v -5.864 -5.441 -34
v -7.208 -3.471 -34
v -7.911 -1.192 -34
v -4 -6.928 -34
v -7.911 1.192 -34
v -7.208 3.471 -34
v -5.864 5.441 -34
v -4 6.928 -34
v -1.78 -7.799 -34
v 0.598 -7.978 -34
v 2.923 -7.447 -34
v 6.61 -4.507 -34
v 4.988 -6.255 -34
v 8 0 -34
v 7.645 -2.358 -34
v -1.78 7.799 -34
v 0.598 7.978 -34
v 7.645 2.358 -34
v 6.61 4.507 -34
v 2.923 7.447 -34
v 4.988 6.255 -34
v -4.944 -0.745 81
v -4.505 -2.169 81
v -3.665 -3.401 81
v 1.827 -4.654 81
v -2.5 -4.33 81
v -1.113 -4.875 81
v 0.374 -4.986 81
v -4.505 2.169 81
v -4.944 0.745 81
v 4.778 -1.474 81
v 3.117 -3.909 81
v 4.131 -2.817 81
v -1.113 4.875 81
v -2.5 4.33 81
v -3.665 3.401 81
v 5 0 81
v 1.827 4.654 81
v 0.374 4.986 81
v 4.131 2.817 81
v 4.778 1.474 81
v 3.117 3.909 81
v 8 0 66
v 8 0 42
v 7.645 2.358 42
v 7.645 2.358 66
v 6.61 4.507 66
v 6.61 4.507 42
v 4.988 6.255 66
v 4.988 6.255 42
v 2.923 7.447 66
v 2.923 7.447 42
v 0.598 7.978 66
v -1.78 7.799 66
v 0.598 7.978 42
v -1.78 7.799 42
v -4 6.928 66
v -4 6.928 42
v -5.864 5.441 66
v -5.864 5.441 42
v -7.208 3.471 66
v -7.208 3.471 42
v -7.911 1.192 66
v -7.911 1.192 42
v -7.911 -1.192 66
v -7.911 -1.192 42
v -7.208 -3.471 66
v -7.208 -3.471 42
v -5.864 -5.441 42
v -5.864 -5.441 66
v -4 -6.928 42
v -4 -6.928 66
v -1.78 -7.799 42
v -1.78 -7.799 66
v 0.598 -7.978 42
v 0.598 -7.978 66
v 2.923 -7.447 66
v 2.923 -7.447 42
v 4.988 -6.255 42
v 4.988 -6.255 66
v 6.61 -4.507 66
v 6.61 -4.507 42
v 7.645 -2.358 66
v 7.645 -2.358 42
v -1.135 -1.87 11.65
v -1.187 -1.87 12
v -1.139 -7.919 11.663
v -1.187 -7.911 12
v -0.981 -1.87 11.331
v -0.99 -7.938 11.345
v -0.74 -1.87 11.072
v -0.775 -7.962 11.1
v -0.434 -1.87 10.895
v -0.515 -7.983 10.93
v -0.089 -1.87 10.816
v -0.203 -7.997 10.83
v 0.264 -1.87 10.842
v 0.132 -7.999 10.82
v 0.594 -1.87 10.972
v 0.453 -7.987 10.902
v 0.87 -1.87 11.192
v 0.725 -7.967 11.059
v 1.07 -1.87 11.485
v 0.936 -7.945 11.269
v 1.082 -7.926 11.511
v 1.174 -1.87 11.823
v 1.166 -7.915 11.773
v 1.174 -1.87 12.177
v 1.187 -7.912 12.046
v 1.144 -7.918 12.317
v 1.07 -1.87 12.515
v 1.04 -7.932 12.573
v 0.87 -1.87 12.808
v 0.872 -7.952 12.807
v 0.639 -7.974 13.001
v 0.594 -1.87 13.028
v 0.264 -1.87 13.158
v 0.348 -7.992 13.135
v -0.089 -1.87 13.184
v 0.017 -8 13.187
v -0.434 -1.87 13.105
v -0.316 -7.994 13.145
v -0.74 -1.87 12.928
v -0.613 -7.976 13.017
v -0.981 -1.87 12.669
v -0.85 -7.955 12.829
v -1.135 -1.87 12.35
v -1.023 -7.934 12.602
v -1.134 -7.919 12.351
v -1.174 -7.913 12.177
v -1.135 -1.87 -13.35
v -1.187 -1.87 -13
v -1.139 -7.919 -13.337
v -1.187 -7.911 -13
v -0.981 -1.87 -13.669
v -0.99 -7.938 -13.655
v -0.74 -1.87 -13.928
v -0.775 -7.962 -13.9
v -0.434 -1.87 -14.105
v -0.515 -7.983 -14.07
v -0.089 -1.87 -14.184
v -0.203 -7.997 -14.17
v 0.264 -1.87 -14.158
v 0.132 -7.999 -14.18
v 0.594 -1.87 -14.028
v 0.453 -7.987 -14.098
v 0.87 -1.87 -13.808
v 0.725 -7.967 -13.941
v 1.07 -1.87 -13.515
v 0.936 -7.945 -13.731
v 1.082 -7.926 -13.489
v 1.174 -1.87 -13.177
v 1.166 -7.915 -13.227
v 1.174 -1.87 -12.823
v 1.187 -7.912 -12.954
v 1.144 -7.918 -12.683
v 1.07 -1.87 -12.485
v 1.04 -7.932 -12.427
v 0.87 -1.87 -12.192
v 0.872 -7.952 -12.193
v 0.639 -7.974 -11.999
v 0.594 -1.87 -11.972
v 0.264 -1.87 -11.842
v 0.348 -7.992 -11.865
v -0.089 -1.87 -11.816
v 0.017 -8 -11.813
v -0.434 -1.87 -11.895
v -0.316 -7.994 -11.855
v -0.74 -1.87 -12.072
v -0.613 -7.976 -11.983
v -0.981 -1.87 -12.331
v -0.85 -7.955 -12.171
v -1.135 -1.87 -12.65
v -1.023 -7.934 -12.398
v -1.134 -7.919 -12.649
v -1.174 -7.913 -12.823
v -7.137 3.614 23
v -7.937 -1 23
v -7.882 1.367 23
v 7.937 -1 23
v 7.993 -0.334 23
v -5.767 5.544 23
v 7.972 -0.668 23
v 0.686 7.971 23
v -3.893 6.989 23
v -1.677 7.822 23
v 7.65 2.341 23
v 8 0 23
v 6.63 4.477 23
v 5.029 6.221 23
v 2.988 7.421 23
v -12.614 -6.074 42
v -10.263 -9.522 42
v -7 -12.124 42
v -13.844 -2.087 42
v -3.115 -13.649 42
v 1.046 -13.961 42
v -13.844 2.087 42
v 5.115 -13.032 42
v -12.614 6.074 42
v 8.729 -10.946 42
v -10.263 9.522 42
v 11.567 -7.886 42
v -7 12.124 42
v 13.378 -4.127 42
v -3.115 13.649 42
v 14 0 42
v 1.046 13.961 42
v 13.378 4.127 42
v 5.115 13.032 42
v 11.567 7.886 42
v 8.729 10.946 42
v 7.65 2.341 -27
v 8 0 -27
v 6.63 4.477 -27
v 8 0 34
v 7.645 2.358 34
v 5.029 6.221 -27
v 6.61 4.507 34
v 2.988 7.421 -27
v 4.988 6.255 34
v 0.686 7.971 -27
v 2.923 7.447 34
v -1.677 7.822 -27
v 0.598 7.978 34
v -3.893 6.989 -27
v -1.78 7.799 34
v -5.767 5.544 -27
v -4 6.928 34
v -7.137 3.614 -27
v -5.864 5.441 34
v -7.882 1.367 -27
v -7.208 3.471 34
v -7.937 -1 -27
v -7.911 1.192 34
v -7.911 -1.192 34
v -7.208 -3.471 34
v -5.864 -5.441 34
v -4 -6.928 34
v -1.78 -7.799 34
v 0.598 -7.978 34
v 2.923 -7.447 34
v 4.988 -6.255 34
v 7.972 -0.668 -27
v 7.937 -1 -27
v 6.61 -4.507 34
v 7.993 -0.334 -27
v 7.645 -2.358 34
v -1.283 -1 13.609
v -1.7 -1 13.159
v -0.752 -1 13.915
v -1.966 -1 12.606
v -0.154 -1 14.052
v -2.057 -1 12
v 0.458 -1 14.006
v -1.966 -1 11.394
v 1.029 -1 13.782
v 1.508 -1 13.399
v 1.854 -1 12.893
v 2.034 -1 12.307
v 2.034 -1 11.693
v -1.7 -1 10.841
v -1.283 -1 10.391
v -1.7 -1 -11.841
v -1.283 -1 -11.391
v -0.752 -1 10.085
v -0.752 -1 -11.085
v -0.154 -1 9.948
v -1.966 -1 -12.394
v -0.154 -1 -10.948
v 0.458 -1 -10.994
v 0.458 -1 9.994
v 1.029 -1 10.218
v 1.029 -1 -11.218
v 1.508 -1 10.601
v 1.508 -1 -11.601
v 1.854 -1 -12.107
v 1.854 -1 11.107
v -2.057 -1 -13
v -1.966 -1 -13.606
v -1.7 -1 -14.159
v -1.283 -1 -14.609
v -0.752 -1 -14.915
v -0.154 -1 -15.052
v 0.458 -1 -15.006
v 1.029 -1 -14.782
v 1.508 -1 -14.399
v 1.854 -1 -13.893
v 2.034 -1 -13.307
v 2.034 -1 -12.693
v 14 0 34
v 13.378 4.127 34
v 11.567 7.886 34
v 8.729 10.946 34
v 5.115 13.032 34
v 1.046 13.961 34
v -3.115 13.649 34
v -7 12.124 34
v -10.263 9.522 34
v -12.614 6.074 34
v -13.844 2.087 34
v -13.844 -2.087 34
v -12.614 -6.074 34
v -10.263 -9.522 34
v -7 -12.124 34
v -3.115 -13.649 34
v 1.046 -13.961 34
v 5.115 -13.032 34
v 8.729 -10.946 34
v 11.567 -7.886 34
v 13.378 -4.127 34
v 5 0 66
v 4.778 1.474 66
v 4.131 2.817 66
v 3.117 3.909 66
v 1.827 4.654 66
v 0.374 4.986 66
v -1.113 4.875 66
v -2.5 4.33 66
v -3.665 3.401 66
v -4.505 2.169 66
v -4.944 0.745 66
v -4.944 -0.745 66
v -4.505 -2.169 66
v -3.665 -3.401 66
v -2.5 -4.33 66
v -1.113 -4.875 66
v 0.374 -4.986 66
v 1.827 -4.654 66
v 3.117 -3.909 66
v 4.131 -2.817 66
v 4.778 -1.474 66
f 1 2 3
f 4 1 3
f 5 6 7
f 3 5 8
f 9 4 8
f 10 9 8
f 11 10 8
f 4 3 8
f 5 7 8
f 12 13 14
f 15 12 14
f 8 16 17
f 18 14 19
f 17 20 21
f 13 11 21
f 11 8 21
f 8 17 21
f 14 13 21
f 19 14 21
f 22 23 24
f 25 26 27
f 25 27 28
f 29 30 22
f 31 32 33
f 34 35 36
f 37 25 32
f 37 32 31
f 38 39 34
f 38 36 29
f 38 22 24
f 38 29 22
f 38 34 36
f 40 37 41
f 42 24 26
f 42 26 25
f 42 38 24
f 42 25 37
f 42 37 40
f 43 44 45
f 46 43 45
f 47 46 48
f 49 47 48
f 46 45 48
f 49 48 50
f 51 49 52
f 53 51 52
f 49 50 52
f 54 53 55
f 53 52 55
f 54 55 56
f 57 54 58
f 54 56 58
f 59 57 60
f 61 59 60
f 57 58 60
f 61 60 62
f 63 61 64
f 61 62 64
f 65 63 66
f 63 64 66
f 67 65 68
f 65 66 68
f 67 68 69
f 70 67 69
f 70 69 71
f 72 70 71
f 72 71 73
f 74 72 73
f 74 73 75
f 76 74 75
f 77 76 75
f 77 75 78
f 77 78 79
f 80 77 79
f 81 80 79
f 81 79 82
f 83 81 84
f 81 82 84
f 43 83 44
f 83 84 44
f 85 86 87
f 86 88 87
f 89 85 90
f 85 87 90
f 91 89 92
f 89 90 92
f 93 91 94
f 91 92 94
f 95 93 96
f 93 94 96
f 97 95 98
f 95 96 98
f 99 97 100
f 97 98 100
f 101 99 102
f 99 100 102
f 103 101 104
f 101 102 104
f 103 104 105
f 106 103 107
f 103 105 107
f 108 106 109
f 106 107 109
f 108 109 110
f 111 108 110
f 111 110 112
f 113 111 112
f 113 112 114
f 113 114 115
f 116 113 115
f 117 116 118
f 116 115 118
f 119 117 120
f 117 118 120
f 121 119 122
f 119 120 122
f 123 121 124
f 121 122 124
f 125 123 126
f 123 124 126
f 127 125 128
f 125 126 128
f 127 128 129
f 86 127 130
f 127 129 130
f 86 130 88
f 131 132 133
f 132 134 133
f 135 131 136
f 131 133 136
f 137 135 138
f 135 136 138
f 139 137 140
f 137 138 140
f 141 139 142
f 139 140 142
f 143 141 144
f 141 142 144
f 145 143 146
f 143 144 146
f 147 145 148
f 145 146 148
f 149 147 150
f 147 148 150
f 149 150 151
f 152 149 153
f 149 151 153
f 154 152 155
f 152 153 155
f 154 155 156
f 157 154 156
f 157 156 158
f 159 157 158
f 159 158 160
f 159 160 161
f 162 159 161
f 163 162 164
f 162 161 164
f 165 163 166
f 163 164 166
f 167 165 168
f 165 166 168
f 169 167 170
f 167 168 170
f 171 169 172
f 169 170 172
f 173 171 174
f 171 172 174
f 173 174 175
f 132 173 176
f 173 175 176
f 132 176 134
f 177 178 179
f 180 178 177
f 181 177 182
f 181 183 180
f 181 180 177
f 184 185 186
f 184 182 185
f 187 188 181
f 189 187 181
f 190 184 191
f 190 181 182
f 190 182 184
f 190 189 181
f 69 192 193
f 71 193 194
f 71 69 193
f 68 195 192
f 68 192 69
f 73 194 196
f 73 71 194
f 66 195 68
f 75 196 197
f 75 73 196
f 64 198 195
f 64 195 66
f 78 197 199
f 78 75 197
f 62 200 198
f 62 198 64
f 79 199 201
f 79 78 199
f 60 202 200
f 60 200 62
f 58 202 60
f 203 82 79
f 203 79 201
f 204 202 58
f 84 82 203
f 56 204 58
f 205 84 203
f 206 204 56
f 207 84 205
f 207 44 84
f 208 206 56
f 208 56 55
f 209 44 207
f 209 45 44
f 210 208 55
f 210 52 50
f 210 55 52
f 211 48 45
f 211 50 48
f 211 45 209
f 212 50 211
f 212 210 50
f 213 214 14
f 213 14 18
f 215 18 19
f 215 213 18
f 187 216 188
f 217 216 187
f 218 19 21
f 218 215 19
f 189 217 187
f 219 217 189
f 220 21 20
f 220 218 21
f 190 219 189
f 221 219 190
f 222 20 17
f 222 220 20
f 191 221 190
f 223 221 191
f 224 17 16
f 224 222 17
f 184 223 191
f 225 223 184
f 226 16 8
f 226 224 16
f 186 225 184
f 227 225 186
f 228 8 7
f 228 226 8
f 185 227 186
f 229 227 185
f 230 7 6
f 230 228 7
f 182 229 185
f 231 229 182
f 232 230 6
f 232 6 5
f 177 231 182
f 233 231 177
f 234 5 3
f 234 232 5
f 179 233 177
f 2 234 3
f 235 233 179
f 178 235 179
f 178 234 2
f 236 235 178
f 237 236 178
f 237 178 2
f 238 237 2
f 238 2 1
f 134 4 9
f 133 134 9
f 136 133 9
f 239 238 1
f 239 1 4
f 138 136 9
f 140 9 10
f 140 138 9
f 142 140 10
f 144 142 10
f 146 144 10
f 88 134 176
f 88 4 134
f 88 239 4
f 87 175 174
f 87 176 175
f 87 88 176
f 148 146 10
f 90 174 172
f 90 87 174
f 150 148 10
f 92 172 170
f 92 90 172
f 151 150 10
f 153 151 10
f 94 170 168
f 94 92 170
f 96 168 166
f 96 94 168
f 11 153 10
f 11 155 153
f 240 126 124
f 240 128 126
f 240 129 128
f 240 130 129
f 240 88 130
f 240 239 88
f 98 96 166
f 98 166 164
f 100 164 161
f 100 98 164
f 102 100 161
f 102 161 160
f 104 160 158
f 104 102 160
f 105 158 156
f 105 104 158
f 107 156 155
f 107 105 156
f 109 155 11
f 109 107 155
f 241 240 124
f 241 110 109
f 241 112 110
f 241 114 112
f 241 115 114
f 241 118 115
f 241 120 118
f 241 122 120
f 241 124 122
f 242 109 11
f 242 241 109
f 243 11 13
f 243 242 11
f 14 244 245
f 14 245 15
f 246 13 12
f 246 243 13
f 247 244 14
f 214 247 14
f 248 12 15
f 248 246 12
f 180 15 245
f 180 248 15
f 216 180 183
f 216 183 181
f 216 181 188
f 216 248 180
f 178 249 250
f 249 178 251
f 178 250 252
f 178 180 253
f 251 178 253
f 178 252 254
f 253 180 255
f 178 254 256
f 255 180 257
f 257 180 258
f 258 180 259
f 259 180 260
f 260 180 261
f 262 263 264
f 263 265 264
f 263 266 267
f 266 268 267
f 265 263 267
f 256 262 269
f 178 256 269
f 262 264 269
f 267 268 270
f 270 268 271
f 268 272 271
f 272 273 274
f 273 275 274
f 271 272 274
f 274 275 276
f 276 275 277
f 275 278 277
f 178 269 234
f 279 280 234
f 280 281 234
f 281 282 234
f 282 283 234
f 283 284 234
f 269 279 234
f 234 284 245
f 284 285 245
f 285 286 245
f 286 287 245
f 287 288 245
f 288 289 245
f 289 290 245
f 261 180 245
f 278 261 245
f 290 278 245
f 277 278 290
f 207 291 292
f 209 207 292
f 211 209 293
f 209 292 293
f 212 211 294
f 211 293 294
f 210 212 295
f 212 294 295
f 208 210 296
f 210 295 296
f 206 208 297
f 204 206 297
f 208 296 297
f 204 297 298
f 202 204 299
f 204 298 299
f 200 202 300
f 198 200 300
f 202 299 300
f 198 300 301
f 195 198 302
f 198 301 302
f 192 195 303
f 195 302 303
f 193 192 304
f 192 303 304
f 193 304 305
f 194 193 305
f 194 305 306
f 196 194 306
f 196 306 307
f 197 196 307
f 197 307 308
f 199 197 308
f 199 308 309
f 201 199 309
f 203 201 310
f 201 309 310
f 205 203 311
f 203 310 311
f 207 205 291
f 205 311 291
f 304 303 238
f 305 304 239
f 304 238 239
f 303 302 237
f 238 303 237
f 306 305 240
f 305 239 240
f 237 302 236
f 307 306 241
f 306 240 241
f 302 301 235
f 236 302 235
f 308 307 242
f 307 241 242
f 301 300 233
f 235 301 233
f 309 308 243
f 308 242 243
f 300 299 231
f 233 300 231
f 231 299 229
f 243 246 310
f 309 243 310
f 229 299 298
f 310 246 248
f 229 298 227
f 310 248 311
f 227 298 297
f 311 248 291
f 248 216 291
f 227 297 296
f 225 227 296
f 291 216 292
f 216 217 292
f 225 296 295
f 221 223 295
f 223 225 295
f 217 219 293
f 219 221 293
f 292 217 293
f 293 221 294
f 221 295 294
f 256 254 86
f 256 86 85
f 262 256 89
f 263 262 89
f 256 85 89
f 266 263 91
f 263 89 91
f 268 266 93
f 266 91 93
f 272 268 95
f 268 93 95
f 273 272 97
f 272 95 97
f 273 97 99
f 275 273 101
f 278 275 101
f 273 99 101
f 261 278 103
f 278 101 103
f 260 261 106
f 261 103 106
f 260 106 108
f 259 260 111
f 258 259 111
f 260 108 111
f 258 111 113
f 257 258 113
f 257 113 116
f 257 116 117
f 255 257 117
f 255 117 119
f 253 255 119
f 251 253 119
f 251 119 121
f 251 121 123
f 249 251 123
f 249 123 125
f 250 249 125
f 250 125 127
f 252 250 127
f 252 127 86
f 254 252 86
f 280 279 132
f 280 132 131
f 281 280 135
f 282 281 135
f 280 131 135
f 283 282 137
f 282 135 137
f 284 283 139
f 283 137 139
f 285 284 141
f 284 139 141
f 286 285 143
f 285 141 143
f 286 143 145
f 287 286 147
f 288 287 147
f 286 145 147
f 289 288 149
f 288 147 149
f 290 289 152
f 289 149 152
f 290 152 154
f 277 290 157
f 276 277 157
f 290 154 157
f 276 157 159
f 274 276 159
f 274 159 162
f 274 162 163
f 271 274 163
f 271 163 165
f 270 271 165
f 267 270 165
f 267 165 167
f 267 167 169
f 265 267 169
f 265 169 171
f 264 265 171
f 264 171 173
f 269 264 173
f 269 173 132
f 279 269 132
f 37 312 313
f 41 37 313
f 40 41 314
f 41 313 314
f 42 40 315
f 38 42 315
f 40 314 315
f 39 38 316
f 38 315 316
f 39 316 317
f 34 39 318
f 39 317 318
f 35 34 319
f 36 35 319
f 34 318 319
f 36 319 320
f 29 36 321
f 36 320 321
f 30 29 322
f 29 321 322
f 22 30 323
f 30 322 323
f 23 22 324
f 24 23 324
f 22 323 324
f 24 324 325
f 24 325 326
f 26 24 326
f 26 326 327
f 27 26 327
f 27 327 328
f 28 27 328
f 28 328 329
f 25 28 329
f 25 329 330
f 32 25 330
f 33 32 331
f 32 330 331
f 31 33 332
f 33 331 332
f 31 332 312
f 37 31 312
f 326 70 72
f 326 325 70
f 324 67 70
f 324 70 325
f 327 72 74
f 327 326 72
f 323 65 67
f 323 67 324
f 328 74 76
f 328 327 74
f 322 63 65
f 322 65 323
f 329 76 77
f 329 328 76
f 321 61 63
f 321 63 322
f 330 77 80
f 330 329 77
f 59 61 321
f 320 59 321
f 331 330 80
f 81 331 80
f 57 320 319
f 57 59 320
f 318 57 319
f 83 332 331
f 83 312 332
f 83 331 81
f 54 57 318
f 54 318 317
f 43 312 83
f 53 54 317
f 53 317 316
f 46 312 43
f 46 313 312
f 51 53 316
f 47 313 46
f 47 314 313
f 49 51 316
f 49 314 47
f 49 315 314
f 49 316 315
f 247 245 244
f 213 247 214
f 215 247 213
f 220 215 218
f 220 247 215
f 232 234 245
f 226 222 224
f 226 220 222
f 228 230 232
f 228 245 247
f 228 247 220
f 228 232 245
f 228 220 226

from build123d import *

# Parameters (mm, degrees)
SKETCH1_R                       = 8
BOSS_EXTRUDE1_DEPTH             = 34
SKETCH2_R                       = 14
BOSS_EXTRUDE2_DEPTH             = 8
SKETCH3_R                       = 8
BOSS_EXTRUDE3_DEPTH             = 24
SKETCH4_R                       = 5
BOSS_EXTRUDE4_DEPTH             = 15
SKETCH5_W                       = 50
SKETCH5_H                       = 13.172720446
CUT_EXTRUDE1_DEPTH              = 15
CUT_EXTRUDE1_DEPTH_BACK         = 15
F_4_48_TAPPED_HOLE1_D           = 2.3749
F_4_48_TAPPED_HOLE1_DEPTH       = 10.35
F_4_48_TAPPED_HOLE1_CSINK_D     = 4.1148
F_4_48_TAPPED_HOLE1_CSINK_ANGLE = 90
F_4_48_TAPPED_HOLE1_TIP         = 0.713491942


with BuildPart() as part:
    # Sketch1 → Boss-Extrude1 (new body, symmetric)
    with BuildSketch(Plane.XY):
        Circle(SKETCH1_R)
    extrude(amount=BOSS_EXTRUDE1_DEPTH, both=True)

    # Sketch2 → Boss-Extrude2 (add)
    with BuildSketch(Plane.XY.offset(34)):
        Circle(SKETCH2_R)
    extrude(amount=BOSS_EXTRUDE2_DEPTH)

    # Sketch3 → Boss-Extrude3 (add)
    with BuildSketch(Plane.XY.offset(42)):
        Circle(SKETCH3_R)
    extrude(amount=BOSS_EXTRUDE3_DEPTH)

    # Sketch4 → Boss-Extrude4 (add)
    with BuildSketch(Plane.XY.offset(66)):
        Circle(SKETCH4_R)
    extrude(amount=BOSS_EXTRUDE4_DEPTH)

    # Sketch5 → Cut-Extrude1 (cut, two sides)
    with BuildSketch(Plane(origin=(0, 0, 0), x_dir=(0, 0, -1), z_dir=(1, 0, 0))) as cut_extrude1_sk:
        with Locations((2, 5.586360223)):
            Rectangle(SKETCH5_W, SKETCH5_H)
    extrude(amount=CUT_EXTRUDE1_DEPTH, mode=Mode.SUBTRACT)
    extrude(cut_extrude1_sk.sketch, amount=-CUT_EXTRUDE1_DEPTH_BACK, mode=Mode.SUBTRACT)

    # #4-48 Tapped Hole1
    with Locations(Plane(origin=(0, -1, 0), x_dir=(1, 0, 0), z_dir=(0, 1, 0))):
        with Locations((0, -12), (0, 13)):
            CounterSinkHole(F_4_48_TAPPED_HOLE1_D / 2, F_4_48_TAPPED_HOLE1_CSINK_D / 2, depth=F_4_48_TAPPED_HOLE1_DEPTH, counter_sink_angle=F_4_48_TAPPED_HOLE1_CSINK_ANGLE)
            with Locations((0, 0, -(F_4_48_TAPPED_HOLE1_DEPTH + F_4_48_TAPPED_HOLE1_TIP / 2))):  # 118° drill point
                Cone(0, F_4_48_TAPPED_HOLE1_D / 2, F_4_48_TAPPED_HOLE1_TIP, mode=Mode.SUBTRACT)


solid = part.part
